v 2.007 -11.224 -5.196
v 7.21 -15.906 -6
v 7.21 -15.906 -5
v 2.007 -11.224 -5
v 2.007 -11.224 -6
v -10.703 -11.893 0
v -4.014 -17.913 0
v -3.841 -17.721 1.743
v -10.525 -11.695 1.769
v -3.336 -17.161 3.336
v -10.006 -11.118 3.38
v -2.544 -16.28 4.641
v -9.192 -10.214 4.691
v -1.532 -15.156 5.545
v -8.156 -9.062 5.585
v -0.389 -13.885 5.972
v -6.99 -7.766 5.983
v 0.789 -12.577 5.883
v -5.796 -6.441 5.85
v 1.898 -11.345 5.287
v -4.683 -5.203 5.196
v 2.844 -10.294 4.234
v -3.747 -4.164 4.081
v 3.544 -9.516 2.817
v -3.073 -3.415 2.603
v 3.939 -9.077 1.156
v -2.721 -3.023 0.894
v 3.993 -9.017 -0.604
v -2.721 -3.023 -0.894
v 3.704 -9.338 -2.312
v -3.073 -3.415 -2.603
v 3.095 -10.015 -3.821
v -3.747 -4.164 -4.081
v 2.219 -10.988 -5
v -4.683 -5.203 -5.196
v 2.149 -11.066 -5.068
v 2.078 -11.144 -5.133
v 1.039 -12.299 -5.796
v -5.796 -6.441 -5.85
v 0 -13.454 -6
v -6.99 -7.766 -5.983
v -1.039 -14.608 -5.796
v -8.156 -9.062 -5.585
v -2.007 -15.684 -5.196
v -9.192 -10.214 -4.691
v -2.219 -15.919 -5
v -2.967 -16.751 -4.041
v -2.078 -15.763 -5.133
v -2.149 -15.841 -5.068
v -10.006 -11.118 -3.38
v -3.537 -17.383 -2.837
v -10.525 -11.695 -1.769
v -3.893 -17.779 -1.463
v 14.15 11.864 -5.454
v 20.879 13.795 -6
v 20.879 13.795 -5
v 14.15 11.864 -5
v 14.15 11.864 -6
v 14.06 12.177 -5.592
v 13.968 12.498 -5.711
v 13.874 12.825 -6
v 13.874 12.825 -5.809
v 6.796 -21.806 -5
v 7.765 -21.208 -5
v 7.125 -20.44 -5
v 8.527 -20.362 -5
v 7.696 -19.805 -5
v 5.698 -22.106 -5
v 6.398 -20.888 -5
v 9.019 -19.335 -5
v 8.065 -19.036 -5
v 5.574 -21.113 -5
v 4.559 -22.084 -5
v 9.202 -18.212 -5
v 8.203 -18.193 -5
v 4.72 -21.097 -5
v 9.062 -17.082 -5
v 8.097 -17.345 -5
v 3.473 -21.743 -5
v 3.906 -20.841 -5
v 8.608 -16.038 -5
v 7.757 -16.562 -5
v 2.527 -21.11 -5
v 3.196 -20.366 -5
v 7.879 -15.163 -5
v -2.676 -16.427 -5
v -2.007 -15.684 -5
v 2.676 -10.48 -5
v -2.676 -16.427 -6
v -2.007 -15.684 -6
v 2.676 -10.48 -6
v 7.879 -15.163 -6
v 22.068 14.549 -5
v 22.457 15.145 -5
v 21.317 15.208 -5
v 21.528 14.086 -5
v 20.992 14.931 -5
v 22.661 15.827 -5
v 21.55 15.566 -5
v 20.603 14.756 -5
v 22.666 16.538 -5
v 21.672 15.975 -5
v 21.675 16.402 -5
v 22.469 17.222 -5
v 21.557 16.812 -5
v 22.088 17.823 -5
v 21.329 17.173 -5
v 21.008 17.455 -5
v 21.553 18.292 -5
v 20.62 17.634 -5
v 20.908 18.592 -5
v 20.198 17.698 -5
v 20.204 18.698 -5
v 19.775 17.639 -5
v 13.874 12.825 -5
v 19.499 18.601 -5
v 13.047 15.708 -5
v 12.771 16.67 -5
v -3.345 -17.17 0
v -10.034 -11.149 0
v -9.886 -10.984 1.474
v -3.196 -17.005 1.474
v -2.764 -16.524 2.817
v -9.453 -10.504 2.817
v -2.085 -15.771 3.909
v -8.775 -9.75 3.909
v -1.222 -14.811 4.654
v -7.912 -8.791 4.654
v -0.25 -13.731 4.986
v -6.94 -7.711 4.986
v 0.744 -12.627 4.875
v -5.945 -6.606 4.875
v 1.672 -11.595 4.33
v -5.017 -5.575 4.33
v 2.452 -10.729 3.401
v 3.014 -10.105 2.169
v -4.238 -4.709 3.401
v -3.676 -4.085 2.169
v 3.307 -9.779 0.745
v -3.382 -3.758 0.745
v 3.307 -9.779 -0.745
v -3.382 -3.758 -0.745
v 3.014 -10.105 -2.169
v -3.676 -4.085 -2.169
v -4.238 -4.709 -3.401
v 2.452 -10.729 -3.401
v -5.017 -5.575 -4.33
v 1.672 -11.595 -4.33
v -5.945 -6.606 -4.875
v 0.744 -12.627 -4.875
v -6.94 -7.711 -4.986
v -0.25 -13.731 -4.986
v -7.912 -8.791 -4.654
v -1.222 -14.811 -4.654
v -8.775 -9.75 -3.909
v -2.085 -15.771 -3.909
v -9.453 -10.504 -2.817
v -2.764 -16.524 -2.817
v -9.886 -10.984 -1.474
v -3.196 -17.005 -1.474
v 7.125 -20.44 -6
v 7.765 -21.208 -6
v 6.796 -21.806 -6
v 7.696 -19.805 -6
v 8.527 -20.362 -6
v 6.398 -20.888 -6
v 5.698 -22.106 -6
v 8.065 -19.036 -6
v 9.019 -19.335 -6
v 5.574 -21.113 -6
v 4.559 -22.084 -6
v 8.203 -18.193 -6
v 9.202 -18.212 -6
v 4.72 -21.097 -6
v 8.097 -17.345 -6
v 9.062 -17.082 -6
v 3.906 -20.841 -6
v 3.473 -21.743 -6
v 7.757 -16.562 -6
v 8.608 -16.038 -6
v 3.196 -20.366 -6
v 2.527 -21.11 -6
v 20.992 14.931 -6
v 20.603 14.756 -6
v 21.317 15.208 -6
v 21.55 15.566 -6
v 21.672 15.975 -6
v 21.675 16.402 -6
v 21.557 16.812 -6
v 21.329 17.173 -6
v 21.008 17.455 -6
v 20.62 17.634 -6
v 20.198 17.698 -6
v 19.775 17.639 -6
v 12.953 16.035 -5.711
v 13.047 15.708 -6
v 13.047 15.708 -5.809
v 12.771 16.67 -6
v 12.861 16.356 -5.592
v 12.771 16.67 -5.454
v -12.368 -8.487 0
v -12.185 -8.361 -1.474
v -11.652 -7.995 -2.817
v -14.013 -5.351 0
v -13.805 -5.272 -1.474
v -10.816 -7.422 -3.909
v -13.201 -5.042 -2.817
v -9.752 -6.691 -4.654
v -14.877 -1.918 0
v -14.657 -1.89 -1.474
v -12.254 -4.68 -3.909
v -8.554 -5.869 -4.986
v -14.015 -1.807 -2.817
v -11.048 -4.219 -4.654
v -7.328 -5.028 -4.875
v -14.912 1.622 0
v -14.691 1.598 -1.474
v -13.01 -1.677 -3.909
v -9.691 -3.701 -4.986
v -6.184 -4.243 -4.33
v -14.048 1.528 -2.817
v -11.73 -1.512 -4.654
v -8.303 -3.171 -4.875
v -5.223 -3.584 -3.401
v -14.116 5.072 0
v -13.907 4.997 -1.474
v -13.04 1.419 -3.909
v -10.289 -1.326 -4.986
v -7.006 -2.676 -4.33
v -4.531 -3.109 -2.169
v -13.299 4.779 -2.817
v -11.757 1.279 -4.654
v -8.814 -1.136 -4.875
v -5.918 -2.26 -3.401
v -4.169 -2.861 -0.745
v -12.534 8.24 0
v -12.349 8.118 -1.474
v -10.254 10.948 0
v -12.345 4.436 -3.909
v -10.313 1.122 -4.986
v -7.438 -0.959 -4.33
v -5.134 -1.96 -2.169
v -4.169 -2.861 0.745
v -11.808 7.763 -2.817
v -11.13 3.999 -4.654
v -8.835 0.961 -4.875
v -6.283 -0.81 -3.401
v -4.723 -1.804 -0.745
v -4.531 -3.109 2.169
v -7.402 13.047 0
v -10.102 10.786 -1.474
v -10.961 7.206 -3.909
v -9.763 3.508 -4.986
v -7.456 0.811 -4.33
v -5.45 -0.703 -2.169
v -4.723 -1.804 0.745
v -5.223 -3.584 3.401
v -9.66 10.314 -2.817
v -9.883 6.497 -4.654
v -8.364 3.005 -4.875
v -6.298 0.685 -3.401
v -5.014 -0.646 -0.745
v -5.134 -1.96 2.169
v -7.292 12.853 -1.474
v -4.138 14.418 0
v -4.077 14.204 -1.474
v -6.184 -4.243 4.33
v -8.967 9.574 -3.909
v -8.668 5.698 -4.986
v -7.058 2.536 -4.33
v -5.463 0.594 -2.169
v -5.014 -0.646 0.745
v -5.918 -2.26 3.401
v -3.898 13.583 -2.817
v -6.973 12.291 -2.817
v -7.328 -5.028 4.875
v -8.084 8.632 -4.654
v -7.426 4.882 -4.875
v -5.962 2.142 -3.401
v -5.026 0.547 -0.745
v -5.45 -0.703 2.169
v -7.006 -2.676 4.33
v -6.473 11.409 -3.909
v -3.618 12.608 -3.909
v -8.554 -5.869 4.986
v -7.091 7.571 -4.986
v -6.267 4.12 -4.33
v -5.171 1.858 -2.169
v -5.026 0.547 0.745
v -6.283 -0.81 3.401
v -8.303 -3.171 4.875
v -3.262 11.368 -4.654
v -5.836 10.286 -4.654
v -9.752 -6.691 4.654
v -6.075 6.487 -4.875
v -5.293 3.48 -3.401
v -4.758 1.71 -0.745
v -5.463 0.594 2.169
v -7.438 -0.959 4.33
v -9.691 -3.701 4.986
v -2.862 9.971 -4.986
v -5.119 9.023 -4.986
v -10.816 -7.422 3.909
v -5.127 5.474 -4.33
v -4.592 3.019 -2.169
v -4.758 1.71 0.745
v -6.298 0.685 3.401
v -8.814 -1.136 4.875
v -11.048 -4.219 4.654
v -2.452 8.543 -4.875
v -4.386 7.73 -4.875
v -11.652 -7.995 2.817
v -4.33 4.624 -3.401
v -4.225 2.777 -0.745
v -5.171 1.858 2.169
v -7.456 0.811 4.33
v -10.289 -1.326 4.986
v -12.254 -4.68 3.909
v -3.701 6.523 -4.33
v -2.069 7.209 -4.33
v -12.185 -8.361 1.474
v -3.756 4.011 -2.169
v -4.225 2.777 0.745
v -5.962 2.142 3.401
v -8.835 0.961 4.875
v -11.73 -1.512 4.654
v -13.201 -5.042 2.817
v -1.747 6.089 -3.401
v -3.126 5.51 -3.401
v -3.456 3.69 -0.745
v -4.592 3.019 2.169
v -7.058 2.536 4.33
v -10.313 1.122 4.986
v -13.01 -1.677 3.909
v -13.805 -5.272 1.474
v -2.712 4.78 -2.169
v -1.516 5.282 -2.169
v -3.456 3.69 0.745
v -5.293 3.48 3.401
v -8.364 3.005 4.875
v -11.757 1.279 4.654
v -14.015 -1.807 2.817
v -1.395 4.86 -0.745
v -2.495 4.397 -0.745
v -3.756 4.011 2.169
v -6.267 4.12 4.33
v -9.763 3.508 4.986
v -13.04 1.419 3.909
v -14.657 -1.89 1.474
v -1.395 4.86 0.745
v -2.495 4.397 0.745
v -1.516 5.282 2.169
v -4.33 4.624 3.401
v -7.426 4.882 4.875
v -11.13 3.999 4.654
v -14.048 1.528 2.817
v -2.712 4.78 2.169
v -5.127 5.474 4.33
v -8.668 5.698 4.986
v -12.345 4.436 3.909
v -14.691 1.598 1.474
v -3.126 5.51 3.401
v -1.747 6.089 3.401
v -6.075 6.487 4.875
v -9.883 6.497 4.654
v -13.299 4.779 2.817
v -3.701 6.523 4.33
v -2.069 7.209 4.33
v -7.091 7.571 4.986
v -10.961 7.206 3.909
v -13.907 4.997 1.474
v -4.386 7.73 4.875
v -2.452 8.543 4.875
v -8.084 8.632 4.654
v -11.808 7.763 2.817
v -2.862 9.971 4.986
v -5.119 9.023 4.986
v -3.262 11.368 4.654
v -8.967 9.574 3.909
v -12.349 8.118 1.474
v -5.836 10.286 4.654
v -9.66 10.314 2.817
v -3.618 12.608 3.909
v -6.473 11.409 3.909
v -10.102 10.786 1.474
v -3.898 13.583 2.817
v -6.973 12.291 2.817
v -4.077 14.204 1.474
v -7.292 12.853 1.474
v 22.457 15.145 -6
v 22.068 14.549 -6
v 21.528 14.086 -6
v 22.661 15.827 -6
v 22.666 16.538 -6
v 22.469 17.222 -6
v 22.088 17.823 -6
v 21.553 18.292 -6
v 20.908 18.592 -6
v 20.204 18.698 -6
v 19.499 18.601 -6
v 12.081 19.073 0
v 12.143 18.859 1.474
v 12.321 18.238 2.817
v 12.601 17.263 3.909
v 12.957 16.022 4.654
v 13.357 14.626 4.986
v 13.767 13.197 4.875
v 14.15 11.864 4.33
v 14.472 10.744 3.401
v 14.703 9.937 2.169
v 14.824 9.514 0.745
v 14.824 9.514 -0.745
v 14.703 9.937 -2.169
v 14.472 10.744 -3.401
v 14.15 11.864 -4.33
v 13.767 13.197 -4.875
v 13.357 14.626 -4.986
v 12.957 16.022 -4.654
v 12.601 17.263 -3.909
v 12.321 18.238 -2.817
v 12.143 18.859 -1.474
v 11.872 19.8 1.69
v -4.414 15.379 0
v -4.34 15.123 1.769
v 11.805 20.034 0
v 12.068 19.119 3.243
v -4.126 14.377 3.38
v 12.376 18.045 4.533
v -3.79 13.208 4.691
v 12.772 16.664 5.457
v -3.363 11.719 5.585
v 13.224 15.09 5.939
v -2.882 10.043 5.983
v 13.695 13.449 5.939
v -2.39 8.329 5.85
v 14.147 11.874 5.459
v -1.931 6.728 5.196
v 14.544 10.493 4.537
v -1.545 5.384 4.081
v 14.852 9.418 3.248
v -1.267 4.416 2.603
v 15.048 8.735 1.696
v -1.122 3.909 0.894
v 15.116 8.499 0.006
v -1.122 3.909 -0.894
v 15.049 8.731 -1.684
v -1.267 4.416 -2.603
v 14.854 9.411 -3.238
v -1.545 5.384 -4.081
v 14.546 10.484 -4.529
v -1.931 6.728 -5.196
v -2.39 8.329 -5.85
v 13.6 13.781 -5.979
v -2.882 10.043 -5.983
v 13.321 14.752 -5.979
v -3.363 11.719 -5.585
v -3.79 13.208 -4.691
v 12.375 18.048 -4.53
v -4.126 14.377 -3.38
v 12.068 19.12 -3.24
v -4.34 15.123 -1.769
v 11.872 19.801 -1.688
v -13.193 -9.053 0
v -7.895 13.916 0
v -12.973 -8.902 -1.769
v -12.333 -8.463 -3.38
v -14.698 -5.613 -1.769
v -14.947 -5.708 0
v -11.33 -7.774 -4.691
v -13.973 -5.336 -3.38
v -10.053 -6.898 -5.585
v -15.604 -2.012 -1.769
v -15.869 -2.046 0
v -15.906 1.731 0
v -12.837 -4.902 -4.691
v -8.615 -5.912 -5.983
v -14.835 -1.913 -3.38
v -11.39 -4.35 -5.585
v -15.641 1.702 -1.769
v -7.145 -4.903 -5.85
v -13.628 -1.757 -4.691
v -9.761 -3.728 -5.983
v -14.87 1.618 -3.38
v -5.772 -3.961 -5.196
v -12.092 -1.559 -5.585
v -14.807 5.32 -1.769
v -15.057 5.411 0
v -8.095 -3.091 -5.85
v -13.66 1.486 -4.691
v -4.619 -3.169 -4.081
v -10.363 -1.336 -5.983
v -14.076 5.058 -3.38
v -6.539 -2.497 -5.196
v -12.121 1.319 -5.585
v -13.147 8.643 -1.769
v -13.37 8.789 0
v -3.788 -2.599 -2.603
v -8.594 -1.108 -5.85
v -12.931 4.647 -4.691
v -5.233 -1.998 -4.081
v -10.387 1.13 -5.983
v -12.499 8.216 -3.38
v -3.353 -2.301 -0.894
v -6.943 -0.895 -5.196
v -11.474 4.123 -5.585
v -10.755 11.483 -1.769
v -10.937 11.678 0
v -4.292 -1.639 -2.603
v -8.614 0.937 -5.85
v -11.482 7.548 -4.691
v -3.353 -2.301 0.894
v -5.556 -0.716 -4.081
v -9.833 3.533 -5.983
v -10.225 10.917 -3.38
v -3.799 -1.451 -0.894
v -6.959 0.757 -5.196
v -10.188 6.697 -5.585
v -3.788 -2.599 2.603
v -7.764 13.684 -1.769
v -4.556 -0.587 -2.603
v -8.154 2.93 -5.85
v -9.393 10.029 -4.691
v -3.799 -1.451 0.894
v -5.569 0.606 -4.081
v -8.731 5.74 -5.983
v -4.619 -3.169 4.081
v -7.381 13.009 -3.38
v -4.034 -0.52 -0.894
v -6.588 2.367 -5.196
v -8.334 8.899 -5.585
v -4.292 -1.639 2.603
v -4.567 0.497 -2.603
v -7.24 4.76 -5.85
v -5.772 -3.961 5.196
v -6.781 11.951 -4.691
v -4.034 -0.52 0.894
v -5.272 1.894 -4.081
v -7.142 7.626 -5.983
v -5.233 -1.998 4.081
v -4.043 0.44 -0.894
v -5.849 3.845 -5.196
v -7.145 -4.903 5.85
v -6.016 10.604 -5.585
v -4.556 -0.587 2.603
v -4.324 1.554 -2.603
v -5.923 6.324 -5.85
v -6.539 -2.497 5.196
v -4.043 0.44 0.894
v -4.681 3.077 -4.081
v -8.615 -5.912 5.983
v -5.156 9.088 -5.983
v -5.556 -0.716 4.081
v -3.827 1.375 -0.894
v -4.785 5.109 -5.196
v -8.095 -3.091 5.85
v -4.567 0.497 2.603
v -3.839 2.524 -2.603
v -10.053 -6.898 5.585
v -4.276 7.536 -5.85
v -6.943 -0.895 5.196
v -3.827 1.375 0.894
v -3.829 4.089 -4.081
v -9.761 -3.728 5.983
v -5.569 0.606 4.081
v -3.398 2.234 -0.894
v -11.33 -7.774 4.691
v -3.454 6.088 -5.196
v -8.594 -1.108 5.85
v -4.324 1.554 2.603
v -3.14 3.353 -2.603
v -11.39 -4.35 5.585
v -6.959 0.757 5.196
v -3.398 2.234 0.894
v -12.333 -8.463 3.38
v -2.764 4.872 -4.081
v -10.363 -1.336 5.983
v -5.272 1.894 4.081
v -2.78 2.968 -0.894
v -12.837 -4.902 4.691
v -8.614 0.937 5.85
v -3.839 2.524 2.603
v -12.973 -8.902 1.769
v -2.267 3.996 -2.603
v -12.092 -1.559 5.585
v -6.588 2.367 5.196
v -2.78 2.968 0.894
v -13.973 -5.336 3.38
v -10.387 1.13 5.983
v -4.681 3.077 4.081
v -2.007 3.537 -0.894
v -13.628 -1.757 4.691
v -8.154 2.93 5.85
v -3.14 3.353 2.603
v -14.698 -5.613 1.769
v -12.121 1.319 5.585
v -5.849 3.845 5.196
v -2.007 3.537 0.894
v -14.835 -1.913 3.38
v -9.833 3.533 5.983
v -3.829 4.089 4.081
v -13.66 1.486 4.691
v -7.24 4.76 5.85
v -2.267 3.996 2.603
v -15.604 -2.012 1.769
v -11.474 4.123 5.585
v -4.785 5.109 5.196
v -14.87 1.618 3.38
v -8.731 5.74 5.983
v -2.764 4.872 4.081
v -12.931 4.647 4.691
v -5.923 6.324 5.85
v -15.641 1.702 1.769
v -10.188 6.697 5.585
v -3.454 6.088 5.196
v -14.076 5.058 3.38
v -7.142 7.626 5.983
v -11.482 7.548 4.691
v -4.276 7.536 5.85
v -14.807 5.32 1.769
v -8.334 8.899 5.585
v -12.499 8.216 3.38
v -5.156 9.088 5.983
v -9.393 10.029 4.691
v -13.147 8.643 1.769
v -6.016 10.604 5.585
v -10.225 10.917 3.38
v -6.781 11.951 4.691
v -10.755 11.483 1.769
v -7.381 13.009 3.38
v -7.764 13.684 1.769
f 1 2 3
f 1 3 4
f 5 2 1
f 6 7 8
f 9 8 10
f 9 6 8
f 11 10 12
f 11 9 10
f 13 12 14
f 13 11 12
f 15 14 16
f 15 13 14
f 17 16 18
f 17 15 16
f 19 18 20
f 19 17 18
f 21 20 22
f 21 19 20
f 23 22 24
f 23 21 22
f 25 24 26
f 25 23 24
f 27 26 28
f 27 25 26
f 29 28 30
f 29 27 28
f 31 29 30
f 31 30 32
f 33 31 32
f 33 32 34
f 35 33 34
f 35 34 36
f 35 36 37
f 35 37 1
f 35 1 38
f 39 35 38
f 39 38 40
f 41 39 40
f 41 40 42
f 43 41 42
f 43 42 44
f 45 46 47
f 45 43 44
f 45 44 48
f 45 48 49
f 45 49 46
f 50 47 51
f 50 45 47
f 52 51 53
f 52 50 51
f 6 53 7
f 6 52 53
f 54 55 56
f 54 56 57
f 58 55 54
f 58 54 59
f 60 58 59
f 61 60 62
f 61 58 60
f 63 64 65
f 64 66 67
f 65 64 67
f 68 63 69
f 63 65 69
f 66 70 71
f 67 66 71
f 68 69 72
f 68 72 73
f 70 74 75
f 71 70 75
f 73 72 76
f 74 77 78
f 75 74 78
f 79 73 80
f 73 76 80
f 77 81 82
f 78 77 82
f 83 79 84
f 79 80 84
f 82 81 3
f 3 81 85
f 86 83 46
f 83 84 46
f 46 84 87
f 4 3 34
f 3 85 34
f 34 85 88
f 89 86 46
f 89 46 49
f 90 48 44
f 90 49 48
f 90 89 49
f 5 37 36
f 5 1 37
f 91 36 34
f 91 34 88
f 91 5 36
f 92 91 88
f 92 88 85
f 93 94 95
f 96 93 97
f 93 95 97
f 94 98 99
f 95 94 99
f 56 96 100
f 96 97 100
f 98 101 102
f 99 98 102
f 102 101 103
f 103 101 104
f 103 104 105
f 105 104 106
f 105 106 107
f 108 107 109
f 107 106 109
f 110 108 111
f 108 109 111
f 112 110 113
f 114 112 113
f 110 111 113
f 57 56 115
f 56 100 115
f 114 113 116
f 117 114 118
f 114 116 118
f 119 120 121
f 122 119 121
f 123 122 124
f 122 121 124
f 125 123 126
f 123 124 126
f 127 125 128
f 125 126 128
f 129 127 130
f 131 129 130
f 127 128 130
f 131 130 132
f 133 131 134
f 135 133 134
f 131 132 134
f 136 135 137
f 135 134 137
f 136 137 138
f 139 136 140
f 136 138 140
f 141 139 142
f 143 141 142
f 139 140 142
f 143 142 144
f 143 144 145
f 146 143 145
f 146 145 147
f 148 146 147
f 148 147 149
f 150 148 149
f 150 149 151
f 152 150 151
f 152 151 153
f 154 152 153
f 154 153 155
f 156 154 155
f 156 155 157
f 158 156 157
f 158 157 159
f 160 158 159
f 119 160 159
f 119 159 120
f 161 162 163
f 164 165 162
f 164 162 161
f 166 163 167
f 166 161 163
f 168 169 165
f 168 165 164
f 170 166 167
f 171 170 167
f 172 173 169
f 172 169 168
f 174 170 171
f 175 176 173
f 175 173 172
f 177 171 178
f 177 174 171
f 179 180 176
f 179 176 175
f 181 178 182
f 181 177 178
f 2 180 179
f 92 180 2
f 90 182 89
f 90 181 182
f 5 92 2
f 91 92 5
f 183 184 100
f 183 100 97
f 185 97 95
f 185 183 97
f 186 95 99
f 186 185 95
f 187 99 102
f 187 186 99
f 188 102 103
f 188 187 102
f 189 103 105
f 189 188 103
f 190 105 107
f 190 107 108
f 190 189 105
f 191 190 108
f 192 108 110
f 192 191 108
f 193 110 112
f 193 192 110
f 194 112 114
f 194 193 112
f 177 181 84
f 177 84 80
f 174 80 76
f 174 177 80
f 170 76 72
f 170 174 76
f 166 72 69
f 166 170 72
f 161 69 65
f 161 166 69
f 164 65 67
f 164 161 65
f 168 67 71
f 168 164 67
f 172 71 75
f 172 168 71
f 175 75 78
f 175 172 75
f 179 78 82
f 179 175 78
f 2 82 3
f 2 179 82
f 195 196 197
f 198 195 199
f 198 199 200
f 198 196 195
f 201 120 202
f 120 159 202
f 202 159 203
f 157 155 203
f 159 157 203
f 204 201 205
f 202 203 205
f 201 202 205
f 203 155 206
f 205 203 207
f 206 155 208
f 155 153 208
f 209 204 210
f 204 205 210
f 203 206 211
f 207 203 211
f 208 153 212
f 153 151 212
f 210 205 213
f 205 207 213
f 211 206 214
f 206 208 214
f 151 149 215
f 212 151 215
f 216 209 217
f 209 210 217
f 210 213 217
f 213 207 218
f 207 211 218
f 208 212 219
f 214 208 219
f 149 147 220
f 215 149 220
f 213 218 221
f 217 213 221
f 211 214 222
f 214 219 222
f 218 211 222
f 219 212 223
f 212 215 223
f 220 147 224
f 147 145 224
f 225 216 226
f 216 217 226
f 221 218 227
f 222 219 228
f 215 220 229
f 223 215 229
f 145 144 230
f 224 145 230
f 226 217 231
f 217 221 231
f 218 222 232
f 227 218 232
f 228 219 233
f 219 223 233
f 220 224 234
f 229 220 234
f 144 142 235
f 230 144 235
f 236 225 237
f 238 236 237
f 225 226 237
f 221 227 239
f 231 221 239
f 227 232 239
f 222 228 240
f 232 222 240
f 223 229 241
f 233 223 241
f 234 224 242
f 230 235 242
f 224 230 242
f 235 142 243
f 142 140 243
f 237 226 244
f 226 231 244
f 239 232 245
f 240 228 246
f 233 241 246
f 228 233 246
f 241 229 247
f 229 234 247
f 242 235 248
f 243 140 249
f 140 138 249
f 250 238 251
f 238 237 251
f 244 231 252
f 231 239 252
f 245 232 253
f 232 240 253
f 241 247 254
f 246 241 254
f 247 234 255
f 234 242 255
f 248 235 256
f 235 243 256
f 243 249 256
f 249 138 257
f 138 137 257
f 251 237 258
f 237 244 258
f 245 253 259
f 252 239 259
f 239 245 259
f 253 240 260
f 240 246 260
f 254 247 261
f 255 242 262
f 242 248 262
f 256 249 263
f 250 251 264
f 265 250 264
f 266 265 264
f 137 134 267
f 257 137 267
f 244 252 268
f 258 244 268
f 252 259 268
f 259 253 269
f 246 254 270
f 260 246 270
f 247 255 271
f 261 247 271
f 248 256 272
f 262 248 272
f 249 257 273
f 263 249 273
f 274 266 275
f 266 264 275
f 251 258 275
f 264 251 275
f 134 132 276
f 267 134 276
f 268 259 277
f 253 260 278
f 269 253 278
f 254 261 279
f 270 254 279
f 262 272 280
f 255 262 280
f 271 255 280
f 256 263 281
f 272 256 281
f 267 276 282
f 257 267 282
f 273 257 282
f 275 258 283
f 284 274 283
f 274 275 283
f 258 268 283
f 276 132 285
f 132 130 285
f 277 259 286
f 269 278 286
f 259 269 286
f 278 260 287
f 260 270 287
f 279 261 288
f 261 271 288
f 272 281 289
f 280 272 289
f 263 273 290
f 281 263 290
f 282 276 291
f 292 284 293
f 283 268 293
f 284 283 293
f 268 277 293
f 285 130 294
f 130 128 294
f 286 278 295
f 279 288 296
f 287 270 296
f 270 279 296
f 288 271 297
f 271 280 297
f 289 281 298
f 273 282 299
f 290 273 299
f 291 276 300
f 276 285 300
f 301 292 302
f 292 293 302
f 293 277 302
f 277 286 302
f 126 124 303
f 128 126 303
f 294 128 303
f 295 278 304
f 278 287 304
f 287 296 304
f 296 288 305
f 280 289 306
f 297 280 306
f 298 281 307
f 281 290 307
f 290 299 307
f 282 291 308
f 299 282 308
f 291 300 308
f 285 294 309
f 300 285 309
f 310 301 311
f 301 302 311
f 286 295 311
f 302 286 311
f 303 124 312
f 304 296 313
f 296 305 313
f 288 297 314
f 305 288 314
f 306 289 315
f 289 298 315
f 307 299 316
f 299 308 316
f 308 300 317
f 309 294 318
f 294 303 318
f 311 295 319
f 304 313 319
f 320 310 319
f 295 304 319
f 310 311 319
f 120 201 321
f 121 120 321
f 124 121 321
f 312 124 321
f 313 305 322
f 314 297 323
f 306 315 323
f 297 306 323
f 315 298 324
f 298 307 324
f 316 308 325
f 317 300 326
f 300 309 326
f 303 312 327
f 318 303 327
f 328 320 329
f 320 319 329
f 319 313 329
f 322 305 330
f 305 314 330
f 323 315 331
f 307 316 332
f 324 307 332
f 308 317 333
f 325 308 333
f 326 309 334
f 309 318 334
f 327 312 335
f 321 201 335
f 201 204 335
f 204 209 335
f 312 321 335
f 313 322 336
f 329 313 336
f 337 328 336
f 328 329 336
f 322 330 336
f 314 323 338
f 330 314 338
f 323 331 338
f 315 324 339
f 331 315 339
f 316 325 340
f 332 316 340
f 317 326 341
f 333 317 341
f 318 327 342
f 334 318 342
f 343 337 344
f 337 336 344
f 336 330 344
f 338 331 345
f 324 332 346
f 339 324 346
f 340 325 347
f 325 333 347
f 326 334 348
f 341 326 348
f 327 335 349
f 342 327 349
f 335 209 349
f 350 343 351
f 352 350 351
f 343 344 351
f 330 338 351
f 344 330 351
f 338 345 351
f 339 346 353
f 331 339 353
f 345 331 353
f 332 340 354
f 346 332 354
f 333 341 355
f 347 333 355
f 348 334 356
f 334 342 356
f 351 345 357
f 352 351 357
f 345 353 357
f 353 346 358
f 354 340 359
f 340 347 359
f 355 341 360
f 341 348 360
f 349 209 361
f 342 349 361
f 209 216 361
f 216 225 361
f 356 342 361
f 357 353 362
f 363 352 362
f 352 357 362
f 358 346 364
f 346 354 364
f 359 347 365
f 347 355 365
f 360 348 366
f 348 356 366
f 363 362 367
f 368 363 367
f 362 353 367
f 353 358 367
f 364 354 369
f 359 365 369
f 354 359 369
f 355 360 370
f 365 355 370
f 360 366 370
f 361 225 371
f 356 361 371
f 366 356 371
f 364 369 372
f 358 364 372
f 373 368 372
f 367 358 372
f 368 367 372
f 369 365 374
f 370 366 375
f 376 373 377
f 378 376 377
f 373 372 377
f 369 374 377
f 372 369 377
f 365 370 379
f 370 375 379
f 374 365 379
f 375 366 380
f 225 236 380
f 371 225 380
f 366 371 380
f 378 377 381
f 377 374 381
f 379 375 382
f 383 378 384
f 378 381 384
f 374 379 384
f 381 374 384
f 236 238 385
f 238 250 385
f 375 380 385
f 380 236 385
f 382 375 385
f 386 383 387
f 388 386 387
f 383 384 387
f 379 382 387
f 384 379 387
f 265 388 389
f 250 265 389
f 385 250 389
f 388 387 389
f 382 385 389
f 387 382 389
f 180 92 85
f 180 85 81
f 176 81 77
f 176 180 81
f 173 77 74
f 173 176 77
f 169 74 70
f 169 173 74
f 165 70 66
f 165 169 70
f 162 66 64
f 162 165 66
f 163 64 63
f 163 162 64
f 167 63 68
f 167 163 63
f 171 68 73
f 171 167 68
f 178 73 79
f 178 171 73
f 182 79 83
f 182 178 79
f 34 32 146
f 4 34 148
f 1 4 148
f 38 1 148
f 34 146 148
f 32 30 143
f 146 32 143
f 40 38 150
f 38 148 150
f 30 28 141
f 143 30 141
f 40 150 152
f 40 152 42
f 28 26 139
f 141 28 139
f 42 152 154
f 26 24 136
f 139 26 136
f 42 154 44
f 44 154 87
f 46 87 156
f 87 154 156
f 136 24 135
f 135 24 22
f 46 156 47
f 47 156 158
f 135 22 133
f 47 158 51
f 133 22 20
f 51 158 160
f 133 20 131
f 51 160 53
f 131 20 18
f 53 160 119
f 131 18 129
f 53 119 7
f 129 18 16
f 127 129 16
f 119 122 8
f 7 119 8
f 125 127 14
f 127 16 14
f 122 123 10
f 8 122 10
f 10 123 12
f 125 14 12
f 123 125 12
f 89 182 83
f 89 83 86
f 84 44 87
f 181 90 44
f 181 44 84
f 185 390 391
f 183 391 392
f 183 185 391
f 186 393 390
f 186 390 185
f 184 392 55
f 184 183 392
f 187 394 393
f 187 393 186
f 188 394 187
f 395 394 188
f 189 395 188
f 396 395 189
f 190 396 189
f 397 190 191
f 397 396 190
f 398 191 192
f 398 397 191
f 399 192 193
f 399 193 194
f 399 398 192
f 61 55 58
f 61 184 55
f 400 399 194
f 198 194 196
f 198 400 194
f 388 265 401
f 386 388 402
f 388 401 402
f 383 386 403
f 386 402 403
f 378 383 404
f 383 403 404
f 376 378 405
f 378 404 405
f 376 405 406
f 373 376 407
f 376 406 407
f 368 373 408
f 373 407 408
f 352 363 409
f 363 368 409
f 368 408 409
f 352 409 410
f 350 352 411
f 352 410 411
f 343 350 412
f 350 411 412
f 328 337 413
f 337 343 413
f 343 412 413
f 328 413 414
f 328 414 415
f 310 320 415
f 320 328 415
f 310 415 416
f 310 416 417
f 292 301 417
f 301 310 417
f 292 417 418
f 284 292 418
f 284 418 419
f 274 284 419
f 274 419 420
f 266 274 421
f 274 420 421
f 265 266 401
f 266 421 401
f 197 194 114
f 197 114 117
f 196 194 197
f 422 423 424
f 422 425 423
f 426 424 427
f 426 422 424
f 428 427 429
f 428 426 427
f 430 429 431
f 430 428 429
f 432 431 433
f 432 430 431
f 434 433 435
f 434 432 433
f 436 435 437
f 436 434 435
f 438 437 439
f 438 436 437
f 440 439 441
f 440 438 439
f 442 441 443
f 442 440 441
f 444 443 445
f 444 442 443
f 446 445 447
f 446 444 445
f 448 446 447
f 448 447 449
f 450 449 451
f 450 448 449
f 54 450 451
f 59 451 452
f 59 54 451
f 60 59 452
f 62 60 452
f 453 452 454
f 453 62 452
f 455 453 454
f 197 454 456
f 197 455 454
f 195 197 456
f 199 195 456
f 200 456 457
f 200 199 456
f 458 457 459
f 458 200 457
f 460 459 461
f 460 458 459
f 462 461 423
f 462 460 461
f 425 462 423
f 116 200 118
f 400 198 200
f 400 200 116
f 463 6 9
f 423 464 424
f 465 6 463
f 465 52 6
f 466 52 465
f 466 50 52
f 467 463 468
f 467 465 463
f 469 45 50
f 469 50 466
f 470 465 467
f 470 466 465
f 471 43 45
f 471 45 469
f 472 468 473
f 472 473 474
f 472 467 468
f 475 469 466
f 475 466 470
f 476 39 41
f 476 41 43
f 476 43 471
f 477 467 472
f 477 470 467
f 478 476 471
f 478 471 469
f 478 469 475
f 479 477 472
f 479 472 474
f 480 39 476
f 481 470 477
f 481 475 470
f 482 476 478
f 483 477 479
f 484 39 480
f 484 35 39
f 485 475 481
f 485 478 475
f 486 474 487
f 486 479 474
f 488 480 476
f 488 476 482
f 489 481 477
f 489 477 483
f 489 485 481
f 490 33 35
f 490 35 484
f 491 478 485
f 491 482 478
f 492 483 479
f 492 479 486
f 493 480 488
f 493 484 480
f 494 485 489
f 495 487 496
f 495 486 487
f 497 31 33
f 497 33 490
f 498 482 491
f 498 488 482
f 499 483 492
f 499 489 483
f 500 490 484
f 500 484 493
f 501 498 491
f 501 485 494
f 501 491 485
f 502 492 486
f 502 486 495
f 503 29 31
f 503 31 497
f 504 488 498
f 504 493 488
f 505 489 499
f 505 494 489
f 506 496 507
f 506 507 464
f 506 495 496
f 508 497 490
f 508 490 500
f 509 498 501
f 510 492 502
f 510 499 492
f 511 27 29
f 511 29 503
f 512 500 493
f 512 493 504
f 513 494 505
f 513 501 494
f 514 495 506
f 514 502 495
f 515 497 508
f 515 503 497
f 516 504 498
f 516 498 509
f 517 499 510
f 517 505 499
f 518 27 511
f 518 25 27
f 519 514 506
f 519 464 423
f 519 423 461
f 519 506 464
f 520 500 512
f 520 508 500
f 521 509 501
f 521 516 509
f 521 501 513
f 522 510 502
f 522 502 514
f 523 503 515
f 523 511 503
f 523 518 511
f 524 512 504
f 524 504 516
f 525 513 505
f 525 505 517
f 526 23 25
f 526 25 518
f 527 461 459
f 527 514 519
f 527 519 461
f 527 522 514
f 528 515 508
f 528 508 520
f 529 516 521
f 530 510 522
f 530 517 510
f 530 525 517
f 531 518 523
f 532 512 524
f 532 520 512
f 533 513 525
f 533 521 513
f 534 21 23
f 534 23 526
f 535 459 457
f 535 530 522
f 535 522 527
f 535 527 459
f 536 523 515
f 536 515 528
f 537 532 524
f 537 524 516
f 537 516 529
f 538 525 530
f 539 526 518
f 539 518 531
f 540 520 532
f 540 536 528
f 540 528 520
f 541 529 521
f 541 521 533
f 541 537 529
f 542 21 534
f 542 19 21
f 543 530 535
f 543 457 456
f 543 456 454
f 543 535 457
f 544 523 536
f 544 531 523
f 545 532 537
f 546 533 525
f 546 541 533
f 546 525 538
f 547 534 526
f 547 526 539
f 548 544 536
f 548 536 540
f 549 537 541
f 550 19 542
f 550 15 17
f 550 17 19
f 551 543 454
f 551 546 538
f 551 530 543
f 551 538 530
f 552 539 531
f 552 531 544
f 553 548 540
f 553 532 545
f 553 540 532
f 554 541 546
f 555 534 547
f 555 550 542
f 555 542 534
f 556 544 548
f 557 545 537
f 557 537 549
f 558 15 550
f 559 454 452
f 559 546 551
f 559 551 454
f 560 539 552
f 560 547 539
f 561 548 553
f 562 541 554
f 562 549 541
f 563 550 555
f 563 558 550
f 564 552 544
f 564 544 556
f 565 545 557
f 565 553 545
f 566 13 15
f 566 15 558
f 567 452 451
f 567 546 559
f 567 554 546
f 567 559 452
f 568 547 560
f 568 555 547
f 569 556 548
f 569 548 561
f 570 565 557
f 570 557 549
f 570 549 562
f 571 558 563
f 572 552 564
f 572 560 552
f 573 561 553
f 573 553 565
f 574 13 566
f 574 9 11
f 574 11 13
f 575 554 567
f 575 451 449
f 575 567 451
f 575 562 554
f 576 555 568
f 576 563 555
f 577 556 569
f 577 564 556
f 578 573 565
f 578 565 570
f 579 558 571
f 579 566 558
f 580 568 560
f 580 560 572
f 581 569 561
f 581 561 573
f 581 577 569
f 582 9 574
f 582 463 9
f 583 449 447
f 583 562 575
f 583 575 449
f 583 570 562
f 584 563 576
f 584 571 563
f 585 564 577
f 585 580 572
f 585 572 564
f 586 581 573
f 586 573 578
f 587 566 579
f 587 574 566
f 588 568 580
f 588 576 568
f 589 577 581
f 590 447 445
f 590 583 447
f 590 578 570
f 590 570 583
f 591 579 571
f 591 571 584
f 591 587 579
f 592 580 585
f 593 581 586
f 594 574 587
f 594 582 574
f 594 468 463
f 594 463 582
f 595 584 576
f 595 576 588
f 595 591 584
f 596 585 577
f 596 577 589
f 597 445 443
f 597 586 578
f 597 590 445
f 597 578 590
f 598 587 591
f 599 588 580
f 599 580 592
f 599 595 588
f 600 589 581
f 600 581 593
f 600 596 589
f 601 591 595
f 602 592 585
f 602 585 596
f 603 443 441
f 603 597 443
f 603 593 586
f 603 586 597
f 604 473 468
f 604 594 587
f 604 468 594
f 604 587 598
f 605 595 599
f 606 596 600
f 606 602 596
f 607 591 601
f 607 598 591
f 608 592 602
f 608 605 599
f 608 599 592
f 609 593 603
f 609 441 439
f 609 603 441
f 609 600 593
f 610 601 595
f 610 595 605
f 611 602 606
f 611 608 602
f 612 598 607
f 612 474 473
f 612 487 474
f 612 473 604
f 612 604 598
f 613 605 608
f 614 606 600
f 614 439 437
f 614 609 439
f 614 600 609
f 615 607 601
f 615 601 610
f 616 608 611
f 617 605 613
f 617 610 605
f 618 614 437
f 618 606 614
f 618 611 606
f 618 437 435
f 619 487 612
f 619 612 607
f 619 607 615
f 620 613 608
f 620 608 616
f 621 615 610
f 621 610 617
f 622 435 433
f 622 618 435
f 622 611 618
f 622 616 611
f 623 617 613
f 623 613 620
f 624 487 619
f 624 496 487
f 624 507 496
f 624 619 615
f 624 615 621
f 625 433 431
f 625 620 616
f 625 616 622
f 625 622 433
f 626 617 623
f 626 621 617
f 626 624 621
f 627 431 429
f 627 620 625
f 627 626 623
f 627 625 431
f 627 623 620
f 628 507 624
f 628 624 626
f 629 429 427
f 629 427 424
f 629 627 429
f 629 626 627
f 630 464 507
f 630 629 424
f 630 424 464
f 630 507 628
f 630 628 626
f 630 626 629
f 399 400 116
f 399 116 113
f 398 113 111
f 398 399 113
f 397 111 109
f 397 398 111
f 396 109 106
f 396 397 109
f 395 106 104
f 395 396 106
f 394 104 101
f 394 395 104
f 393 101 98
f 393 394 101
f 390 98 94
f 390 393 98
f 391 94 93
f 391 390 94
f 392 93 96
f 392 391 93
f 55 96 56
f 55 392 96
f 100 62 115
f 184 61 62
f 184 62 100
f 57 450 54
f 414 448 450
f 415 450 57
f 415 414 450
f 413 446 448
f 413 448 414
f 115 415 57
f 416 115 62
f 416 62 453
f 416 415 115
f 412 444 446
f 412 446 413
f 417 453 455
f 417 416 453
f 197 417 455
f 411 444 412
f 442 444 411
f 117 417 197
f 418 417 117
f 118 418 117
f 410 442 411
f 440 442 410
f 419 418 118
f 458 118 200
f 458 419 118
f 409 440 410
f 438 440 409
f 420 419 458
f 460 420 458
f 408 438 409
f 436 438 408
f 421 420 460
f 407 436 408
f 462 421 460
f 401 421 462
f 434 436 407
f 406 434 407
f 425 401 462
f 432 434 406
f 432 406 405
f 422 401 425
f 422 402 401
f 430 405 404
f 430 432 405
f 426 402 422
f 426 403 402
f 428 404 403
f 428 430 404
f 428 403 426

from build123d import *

# Parameters (mm, degrees)
VARREDURA_FINO1_PROFILE_R   = 6
VARREDURA_FINO1_PROFILE_R_2 = 5
RESSALTO_EXTRUS_O1_DEPTH    = 1


with BuildPart() as part:
    # Varredura-Fino1: sweep along a path in Esbo_o1
    with BuildLine(Plane.XY) as varredura_fino1_path:
        Line((0, -13.453624047), (-6.689647316, -7.432941462))
        ThreePointArc((-6.689647316, -7.432941462), (-9.74420246, 2.247335849), (-2.758518872, 9.612001541))
        Line((-2.758518872, 9.612001541), (13.460564792, 14.266666669))
    # Varredura-Fino1 profile (on start of the path) → Varredura-Fino1 (sweep)
    with BuildSketch(Plane(origin=(0, -13.453624047, 0), x_dir=(-0.6689647316224496, -0.7432941462471664, 0), z_dir=(-0.7432941462471664, 0.6689647316224496, 0))):
        Circle(VARREDURA_FINO1_PROFILE_R)
        Circle(VARREDURA_FINO1_PROFILE_R_2, mode=Mode.SUBTRACT)
    sweep(path=varredura_fino1_path.line)

    # Esbo_o19 → Ressalto-extrus_o1 (add)
    with BuildSketch(Plane(origin=(0, 0, -6), x_dir=(-1, 0, 0), z_dir=(0, 0, -1))):
        with BuildLine():
            Line((-13.046786961, 15.7084669), (-12.770935074, 16.669667054))
            Line((-12.770935074, 16.669667054), (-19.499336153, 18.600630265))
            ThreePointArc((-19.499336153, 18.600630265), (-22.591966256, 16.887259598), (-20.878595589, 13.794629494))
            Line((-20.878595589, 13.794629494), (-14.15019451, 11.863666283))
            Line((-14.15019451, 11.863666283), (-13.874342623, 12.824866438))
            Line((-13.874342623, 12.824866438), (-20.602743702, 14.755829648))
            ThreePointArc((-20.602743702, 14.755829648), (-21.630766102, 16.61140771), (-19.77518804, 17.639430111))
            Line((-19.77518804, 17.639430111), (-13.046786961, 15.7084669))
        make_face()
        with BuildLine():
            Line((-2.006894195, -11.223741608), (-2.675858926, -10.480447462))
            Line((-2.675858926, -10.480447462), (-7.87891795, -15.163200583))
            ThreePointArc((-7.87891795, -15.163200583), (-8.176235609, -20.812236095), (-2.527200097, -21.109553753))
            Line((-2.527200097, -21.109553753), (2.675858926, -16.426800632))
            Line((2.675858926, -16.426800632), (2.006894195, -15.683506486))
            Line((2.006894195, -15.683506486), (-3.196164829, -20.366259607))
            ThreePointArc((-3.196164829, -20.366259607), (-7.432941462, -20.143271363), (-7.209953219, -15.90649473))
            Line((-7.209953219, -15.90649473), (-2.006894195, -11.223741608))
        make_face()
    extrude(amount=-RESSALTO_EXTRUS_O1_DEPTH)


solid = part.part
